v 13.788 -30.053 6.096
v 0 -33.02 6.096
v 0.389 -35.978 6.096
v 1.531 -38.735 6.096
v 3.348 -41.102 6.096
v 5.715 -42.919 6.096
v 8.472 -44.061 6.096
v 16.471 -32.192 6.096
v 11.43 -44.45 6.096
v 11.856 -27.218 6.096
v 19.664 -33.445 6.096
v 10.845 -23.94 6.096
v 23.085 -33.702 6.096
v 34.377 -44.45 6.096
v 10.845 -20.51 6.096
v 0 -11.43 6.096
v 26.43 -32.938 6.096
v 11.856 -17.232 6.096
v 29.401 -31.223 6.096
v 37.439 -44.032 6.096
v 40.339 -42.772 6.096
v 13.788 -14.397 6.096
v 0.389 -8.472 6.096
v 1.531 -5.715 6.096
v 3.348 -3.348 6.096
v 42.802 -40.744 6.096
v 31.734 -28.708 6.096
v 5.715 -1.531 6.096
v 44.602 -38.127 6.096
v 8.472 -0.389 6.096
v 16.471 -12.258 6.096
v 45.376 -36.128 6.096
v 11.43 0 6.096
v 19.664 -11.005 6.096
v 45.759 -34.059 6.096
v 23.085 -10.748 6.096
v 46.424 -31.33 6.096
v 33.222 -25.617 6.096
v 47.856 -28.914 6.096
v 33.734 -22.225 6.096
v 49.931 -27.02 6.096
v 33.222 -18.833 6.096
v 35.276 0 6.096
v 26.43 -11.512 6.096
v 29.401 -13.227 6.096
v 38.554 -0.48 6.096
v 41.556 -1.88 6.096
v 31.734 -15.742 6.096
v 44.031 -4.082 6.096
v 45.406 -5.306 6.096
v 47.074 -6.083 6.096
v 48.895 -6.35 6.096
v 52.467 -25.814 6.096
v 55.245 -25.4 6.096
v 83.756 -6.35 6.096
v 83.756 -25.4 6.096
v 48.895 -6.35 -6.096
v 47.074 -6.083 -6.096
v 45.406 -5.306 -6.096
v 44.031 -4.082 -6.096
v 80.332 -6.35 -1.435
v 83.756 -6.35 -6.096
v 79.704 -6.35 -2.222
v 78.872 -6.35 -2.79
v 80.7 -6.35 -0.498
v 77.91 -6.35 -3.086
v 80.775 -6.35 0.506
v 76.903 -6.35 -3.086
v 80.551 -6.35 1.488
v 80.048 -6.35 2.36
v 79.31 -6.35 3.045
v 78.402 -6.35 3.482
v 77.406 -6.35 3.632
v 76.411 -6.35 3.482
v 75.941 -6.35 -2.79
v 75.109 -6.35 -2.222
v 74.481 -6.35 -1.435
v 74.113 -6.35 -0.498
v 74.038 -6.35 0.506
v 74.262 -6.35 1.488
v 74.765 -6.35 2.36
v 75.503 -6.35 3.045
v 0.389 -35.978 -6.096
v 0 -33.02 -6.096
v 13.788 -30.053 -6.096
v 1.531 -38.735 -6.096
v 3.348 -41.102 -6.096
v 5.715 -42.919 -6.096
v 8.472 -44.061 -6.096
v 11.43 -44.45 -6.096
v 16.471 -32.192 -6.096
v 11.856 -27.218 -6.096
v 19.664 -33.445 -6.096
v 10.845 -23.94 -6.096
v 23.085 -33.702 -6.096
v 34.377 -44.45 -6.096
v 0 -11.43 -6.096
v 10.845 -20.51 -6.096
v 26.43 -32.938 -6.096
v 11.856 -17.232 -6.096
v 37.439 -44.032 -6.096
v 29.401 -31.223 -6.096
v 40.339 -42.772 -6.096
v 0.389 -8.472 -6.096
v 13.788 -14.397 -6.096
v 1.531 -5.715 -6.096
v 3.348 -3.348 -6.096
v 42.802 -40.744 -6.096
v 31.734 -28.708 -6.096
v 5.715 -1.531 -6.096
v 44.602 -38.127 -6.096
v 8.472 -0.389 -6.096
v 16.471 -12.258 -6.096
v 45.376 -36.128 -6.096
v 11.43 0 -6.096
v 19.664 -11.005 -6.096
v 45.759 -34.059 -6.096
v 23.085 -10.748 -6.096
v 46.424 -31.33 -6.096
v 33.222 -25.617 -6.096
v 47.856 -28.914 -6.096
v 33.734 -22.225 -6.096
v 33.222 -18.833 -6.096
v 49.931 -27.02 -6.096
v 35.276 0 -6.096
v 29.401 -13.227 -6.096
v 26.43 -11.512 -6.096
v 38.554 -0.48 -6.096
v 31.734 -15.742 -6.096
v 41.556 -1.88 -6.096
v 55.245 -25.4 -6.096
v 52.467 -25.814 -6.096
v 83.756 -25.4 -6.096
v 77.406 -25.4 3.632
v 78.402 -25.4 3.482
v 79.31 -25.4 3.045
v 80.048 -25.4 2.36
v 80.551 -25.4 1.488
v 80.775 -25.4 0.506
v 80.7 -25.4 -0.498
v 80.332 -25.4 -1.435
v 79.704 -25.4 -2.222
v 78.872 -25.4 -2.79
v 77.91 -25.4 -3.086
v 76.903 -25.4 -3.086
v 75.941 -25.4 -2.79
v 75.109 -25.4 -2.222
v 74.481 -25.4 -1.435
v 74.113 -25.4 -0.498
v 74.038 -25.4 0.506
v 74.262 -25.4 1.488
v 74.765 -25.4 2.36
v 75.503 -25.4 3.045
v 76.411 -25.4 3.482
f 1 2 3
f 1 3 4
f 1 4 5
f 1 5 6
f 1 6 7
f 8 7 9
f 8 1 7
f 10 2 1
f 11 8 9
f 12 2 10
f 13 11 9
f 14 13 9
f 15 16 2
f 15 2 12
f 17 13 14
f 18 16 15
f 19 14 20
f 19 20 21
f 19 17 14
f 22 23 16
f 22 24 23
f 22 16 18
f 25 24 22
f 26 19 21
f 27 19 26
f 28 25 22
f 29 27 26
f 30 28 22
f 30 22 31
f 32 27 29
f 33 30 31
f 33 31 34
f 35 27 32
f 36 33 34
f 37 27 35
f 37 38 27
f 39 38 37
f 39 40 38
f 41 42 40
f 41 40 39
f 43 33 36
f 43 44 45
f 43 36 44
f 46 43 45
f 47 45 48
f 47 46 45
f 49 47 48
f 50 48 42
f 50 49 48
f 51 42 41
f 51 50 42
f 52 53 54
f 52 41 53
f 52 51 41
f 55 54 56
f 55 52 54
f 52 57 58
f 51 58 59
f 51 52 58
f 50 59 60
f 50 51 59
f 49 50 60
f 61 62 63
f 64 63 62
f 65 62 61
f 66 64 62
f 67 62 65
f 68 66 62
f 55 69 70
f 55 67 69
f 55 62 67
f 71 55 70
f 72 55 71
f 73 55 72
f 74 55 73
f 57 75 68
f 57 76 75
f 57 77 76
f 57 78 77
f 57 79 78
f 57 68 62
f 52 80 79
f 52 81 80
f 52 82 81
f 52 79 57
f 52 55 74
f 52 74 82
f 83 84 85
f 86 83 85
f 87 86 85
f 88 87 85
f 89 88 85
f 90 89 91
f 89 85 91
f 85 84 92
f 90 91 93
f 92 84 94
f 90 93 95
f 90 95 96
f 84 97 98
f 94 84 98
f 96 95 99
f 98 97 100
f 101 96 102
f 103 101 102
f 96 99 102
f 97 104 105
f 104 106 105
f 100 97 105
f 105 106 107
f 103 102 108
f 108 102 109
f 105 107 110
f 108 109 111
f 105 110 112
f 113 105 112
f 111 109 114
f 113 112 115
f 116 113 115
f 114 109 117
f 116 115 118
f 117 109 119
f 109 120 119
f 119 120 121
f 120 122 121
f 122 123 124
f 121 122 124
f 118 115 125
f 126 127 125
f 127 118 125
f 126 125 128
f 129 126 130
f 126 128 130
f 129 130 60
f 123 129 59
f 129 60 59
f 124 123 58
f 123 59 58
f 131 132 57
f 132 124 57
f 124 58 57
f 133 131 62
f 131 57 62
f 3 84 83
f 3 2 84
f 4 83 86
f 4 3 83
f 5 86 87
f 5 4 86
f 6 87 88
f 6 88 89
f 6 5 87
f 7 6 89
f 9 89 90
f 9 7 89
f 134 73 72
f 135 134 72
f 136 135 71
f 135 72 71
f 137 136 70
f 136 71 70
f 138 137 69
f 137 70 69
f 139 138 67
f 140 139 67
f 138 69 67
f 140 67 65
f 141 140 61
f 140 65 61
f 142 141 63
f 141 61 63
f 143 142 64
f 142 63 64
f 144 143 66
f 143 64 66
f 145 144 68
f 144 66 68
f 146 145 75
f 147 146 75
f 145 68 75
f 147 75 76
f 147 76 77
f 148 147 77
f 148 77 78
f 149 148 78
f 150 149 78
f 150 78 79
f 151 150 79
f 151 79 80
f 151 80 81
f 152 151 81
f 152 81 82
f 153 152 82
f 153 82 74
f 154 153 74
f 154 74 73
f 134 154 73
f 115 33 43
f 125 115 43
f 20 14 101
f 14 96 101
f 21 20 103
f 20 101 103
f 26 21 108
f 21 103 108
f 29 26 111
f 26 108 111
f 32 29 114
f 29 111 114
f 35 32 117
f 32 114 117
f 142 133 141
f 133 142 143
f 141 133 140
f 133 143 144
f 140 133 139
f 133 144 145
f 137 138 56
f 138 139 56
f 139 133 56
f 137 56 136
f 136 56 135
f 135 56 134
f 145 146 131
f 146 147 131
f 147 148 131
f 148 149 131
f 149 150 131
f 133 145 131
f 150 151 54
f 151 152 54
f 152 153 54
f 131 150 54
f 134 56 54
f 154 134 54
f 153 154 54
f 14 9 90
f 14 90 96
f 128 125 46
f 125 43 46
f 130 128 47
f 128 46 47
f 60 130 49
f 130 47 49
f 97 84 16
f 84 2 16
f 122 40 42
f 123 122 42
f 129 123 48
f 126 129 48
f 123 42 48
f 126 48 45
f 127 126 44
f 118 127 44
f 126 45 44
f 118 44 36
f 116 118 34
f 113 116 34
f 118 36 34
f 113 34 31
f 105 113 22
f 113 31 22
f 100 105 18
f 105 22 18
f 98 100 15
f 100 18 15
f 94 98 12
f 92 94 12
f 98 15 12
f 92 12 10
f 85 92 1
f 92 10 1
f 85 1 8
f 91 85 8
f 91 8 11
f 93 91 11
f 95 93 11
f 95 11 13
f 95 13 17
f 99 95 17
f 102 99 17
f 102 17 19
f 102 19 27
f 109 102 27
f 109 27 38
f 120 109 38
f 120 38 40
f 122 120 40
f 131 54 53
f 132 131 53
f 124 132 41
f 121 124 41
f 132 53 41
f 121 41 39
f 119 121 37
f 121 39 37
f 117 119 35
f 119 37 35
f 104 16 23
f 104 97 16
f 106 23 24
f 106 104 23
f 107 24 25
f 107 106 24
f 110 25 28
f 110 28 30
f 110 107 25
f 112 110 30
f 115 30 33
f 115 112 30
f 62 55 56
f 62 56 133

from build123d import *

# Parameters (mm, degrees)
SKETCH1_W           = 96.52
SKETCH1_H           = 44.45
BOSS_EXTRUDE1_DEPTH = 6.096
CUT_EXTRUDE1_REACH  = 108.961
SKETCH2_R           = 11.50874
CUT_EXTRUDE2_REACH  = 108.438
SKETCH3_R           = 3.3782
CUT_EXTRUDE3_REACH  = 108.961
SKETCH7_W           = 12.7635
SKETCH7_H           = 12.192
CUT_EXTRUDE5_DEPTH  = 104.946532487
FILLET1_R           = 11.43


with BuildPart() as part:
    # Sketch1 → Boss-Extrude1 (new, symmetric)
    with BuildSketch(Plane.XY):
        with Locations((48.26, -22.225)):
            Rectangle(SKETCH1_W, SKETCH1_H)
    extrude(amount=BOSS_EXTRUDE1_DEPTH, both=True)

    # Sketch2 → Cut-Extrude1 (cut, up to next)
    with BuildSketch(Plane.XY.offset(6.096), mode=Mode.PRIVATE) as cut_extrude1_sk1:
        with Locations((22.225, -22.225)):
            Circle(SKETCH2_R)
    cut_extrude1_tool1 = extrude(cut_extrude1_sk1.sketch, amount=-CUT_EXTRUDE1_REACH, mode=Mode.PRIVATE) & part.part
    add(cut_extrude1_tool1.solids().sort_by_distance((22.225, -22.225, 6.096))[0], mode=Mode.SUBTRACT)

    # Sketch3 → Cut-Extrude2 (cut, up to next)
    with BuildSketch(Plane(origin=(0, 0, 0), x_dir=(1, 0, 0), z_dir=(0, 1, 0)), mode=Mode.PRIVATE) as cut_extrude2_sk1:
        with Locations(Location((77.4065, -0.254, 0), (0, 0, 270))):
            Circle(SKETCH3_R)
    cut_extrude2_tool1 = extrude(cut_extrude2_sk1.sketch, amount=-CUT_EXTRUDE2_REACH, mode=Mode.PRIVATE) & part.part
    add(cut_extrude2_tool1.solids().sort_by_distance((77.4065, 0, 0.254))[0], mode=Mode.SUBTRACT)

    # Sketch4 → Cut-Extrude3 (cut, up to next)
    with BuildSketch(Plane.XY.offset(6.096), mode=Mode.PRIVATE) as cut_extrude3_sk1:
        with BuildLine():
            Line((48.895, 6.35), (96.52, 6.35))
            ThreePointArc((96.52, 6.35), (102.87, 0), (96.52, -6.35))
            Line((96.52, -6.35), (48.895, -6.35))
            ThreePointArc((48.895, -6.35), (42.545, 0), (48.895, 6.35))
        make_face()
    cut_extrude3_tool1 = extrude(cut_extrude3_sk1.sketch, amount=-CUT_EXTRUDE3_REACH, mode=Mode.PRIVATE) & part.part
    # Sketch4 → Cut-Extrude3 (cut, up to next)
    with BuildSketch(Plane.XY.offset(6.096), mode=Mode.PRIVATE) as cut_extrude3_sk2:
        with BuildLine():
            Line((45.72, -34.925), (45.72, -44.45))
            Line((45.72, -44.45), (55.245, -44.45))
            Line((55.245, -44.45), (96.52, -44.45))
            ThreePointArc((96.52, -44.45), (106.045, -34.925), (96.52, -25.4))
            Line((96.52, -25.4), (55.245, -25.4))
            ThreePointArc((55.245, -25.4), (48.509807909, -28.189807909), (45.72, -34.925))
        make_face()
    cut_extrude3_tool2 = extrude(cut_extrude3_sk2.sketch, amount=-CUT_EXTRUDE3_REACH, mode=Mode.PRIVATE) & part.part
    add(cut_extrude3_tool1.solids().sort_by_distance((72.7075, 0, 6.096))[0], mode=Mode.SUBTRACT)
    add(cut_extrude3_tool2.solids().sort_by_distance((75.382091, -35.05704, 6.096))[0], mode=Mode.SUBTRACT)

    # Sketch7 → Cut-Extrude5 (cut, through all)
    with BuildSketch(Plane(origin=(0, -6.35, 0), x_dir=(1, 0, 0), z_dir=(0, 1, 0))):
        with Locations((90.13825, 0)):
            Rectangle(SKETCH7_W, SKETCH7_H)
    extrude(amount=-CUT_EXTRUDE5_DEPTH, mode=Mode.SUBTRACT)

    # Fillet1
    fillet1_edges = [part.edges().sort_by_distance(p)[0] for p in [
        (42.545, 0, 0),
        (45.72, -44.45, 0),
        (0, -44.45, 0),
        (0, 0, 0),
    ]]
    fillet(fillet1_edges, radius=FILLET1_R)


solid = part.part
